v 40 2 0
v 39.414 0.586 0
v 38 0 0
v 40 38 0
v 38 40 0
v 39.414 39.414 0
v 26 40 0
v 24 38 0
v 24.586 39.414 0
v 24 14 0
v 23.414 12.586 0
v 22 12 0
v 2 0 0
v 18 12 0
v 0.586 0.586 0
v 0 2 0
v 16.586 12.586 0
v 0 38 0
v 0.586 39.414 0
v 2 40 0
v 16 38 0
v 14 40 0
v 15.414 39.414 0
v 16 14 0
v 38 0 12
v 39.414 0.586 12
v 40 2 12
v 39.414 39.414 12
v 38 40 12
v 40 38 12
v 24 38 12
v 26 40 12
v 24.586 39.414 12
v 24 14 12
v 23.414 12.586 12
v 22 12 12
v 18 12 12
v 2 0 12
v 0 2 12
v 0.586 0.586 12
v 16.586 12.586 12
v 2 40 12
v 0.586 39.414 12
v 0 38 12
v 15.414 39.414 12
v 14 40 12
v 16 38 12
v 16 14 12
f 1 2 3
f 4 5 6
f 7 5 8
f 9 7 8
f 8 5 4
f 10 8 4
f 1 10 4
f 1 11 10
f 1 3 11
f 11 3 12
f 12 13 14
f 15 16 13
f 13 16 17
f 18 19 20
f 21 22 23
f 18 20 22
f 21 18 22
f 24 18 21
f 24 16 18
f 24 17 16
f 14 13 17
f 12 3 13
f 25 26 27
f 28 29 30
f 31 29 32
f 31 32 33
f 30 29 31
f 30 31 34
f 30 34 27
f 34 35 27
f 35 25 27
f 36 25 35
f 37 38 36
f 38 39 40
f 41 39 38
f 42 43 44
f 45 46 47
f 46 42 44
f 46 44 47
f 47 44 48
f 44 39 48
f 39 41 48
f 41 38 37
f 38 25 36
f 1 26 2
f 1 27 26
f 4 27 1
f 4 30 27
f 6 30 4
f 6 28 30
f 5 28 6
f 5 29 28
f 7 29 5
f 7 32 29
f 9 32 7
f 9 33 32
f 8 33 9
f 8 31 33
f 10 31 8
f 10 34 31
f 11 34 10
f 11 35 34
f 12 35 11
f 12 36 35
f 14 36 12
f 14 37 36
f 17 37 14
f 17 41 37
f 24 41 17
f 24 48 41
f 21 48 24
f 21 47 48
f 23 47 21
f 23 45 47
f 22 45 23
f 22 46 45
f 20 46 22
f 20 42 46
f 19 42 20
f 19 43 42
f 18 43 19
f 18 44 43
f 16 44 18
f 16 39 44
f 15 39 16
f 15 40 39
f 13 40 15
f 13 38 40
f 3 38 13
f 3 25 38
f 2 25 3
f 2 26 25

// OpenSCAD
$fn = 32;

// ----------------------------------------------------------------------
// Eye lug: clevis, 12 mm thick
// ----------------------------------------------------------------------

// --- parameters (mm) ---
profile_height = 12;      // extrusion height
profile_points = 24;      // points of the closed outline

profile = [[0, 2], [0.586, 0.586], [2, 0], [38, 0], [39.414, 0.586], [40, 2], [40, 38], [39.414, 39.414], [38, 40], [26, 40], [24.586, 39.414], [24, 38], [24, 14], [23.414, 12.586], [22, 12], [18, 12], [16.586, 12.586], [16, 14], [16, 38], [15.414, 39.414], [14, 40], [2, 40], [0.586, 39.414], [0, 38]];  // single closed polygon, 24 points, counter clockwise

// --- the one profile operation ---
linear_extrude(height = profile_height) polygon(points = profile);
